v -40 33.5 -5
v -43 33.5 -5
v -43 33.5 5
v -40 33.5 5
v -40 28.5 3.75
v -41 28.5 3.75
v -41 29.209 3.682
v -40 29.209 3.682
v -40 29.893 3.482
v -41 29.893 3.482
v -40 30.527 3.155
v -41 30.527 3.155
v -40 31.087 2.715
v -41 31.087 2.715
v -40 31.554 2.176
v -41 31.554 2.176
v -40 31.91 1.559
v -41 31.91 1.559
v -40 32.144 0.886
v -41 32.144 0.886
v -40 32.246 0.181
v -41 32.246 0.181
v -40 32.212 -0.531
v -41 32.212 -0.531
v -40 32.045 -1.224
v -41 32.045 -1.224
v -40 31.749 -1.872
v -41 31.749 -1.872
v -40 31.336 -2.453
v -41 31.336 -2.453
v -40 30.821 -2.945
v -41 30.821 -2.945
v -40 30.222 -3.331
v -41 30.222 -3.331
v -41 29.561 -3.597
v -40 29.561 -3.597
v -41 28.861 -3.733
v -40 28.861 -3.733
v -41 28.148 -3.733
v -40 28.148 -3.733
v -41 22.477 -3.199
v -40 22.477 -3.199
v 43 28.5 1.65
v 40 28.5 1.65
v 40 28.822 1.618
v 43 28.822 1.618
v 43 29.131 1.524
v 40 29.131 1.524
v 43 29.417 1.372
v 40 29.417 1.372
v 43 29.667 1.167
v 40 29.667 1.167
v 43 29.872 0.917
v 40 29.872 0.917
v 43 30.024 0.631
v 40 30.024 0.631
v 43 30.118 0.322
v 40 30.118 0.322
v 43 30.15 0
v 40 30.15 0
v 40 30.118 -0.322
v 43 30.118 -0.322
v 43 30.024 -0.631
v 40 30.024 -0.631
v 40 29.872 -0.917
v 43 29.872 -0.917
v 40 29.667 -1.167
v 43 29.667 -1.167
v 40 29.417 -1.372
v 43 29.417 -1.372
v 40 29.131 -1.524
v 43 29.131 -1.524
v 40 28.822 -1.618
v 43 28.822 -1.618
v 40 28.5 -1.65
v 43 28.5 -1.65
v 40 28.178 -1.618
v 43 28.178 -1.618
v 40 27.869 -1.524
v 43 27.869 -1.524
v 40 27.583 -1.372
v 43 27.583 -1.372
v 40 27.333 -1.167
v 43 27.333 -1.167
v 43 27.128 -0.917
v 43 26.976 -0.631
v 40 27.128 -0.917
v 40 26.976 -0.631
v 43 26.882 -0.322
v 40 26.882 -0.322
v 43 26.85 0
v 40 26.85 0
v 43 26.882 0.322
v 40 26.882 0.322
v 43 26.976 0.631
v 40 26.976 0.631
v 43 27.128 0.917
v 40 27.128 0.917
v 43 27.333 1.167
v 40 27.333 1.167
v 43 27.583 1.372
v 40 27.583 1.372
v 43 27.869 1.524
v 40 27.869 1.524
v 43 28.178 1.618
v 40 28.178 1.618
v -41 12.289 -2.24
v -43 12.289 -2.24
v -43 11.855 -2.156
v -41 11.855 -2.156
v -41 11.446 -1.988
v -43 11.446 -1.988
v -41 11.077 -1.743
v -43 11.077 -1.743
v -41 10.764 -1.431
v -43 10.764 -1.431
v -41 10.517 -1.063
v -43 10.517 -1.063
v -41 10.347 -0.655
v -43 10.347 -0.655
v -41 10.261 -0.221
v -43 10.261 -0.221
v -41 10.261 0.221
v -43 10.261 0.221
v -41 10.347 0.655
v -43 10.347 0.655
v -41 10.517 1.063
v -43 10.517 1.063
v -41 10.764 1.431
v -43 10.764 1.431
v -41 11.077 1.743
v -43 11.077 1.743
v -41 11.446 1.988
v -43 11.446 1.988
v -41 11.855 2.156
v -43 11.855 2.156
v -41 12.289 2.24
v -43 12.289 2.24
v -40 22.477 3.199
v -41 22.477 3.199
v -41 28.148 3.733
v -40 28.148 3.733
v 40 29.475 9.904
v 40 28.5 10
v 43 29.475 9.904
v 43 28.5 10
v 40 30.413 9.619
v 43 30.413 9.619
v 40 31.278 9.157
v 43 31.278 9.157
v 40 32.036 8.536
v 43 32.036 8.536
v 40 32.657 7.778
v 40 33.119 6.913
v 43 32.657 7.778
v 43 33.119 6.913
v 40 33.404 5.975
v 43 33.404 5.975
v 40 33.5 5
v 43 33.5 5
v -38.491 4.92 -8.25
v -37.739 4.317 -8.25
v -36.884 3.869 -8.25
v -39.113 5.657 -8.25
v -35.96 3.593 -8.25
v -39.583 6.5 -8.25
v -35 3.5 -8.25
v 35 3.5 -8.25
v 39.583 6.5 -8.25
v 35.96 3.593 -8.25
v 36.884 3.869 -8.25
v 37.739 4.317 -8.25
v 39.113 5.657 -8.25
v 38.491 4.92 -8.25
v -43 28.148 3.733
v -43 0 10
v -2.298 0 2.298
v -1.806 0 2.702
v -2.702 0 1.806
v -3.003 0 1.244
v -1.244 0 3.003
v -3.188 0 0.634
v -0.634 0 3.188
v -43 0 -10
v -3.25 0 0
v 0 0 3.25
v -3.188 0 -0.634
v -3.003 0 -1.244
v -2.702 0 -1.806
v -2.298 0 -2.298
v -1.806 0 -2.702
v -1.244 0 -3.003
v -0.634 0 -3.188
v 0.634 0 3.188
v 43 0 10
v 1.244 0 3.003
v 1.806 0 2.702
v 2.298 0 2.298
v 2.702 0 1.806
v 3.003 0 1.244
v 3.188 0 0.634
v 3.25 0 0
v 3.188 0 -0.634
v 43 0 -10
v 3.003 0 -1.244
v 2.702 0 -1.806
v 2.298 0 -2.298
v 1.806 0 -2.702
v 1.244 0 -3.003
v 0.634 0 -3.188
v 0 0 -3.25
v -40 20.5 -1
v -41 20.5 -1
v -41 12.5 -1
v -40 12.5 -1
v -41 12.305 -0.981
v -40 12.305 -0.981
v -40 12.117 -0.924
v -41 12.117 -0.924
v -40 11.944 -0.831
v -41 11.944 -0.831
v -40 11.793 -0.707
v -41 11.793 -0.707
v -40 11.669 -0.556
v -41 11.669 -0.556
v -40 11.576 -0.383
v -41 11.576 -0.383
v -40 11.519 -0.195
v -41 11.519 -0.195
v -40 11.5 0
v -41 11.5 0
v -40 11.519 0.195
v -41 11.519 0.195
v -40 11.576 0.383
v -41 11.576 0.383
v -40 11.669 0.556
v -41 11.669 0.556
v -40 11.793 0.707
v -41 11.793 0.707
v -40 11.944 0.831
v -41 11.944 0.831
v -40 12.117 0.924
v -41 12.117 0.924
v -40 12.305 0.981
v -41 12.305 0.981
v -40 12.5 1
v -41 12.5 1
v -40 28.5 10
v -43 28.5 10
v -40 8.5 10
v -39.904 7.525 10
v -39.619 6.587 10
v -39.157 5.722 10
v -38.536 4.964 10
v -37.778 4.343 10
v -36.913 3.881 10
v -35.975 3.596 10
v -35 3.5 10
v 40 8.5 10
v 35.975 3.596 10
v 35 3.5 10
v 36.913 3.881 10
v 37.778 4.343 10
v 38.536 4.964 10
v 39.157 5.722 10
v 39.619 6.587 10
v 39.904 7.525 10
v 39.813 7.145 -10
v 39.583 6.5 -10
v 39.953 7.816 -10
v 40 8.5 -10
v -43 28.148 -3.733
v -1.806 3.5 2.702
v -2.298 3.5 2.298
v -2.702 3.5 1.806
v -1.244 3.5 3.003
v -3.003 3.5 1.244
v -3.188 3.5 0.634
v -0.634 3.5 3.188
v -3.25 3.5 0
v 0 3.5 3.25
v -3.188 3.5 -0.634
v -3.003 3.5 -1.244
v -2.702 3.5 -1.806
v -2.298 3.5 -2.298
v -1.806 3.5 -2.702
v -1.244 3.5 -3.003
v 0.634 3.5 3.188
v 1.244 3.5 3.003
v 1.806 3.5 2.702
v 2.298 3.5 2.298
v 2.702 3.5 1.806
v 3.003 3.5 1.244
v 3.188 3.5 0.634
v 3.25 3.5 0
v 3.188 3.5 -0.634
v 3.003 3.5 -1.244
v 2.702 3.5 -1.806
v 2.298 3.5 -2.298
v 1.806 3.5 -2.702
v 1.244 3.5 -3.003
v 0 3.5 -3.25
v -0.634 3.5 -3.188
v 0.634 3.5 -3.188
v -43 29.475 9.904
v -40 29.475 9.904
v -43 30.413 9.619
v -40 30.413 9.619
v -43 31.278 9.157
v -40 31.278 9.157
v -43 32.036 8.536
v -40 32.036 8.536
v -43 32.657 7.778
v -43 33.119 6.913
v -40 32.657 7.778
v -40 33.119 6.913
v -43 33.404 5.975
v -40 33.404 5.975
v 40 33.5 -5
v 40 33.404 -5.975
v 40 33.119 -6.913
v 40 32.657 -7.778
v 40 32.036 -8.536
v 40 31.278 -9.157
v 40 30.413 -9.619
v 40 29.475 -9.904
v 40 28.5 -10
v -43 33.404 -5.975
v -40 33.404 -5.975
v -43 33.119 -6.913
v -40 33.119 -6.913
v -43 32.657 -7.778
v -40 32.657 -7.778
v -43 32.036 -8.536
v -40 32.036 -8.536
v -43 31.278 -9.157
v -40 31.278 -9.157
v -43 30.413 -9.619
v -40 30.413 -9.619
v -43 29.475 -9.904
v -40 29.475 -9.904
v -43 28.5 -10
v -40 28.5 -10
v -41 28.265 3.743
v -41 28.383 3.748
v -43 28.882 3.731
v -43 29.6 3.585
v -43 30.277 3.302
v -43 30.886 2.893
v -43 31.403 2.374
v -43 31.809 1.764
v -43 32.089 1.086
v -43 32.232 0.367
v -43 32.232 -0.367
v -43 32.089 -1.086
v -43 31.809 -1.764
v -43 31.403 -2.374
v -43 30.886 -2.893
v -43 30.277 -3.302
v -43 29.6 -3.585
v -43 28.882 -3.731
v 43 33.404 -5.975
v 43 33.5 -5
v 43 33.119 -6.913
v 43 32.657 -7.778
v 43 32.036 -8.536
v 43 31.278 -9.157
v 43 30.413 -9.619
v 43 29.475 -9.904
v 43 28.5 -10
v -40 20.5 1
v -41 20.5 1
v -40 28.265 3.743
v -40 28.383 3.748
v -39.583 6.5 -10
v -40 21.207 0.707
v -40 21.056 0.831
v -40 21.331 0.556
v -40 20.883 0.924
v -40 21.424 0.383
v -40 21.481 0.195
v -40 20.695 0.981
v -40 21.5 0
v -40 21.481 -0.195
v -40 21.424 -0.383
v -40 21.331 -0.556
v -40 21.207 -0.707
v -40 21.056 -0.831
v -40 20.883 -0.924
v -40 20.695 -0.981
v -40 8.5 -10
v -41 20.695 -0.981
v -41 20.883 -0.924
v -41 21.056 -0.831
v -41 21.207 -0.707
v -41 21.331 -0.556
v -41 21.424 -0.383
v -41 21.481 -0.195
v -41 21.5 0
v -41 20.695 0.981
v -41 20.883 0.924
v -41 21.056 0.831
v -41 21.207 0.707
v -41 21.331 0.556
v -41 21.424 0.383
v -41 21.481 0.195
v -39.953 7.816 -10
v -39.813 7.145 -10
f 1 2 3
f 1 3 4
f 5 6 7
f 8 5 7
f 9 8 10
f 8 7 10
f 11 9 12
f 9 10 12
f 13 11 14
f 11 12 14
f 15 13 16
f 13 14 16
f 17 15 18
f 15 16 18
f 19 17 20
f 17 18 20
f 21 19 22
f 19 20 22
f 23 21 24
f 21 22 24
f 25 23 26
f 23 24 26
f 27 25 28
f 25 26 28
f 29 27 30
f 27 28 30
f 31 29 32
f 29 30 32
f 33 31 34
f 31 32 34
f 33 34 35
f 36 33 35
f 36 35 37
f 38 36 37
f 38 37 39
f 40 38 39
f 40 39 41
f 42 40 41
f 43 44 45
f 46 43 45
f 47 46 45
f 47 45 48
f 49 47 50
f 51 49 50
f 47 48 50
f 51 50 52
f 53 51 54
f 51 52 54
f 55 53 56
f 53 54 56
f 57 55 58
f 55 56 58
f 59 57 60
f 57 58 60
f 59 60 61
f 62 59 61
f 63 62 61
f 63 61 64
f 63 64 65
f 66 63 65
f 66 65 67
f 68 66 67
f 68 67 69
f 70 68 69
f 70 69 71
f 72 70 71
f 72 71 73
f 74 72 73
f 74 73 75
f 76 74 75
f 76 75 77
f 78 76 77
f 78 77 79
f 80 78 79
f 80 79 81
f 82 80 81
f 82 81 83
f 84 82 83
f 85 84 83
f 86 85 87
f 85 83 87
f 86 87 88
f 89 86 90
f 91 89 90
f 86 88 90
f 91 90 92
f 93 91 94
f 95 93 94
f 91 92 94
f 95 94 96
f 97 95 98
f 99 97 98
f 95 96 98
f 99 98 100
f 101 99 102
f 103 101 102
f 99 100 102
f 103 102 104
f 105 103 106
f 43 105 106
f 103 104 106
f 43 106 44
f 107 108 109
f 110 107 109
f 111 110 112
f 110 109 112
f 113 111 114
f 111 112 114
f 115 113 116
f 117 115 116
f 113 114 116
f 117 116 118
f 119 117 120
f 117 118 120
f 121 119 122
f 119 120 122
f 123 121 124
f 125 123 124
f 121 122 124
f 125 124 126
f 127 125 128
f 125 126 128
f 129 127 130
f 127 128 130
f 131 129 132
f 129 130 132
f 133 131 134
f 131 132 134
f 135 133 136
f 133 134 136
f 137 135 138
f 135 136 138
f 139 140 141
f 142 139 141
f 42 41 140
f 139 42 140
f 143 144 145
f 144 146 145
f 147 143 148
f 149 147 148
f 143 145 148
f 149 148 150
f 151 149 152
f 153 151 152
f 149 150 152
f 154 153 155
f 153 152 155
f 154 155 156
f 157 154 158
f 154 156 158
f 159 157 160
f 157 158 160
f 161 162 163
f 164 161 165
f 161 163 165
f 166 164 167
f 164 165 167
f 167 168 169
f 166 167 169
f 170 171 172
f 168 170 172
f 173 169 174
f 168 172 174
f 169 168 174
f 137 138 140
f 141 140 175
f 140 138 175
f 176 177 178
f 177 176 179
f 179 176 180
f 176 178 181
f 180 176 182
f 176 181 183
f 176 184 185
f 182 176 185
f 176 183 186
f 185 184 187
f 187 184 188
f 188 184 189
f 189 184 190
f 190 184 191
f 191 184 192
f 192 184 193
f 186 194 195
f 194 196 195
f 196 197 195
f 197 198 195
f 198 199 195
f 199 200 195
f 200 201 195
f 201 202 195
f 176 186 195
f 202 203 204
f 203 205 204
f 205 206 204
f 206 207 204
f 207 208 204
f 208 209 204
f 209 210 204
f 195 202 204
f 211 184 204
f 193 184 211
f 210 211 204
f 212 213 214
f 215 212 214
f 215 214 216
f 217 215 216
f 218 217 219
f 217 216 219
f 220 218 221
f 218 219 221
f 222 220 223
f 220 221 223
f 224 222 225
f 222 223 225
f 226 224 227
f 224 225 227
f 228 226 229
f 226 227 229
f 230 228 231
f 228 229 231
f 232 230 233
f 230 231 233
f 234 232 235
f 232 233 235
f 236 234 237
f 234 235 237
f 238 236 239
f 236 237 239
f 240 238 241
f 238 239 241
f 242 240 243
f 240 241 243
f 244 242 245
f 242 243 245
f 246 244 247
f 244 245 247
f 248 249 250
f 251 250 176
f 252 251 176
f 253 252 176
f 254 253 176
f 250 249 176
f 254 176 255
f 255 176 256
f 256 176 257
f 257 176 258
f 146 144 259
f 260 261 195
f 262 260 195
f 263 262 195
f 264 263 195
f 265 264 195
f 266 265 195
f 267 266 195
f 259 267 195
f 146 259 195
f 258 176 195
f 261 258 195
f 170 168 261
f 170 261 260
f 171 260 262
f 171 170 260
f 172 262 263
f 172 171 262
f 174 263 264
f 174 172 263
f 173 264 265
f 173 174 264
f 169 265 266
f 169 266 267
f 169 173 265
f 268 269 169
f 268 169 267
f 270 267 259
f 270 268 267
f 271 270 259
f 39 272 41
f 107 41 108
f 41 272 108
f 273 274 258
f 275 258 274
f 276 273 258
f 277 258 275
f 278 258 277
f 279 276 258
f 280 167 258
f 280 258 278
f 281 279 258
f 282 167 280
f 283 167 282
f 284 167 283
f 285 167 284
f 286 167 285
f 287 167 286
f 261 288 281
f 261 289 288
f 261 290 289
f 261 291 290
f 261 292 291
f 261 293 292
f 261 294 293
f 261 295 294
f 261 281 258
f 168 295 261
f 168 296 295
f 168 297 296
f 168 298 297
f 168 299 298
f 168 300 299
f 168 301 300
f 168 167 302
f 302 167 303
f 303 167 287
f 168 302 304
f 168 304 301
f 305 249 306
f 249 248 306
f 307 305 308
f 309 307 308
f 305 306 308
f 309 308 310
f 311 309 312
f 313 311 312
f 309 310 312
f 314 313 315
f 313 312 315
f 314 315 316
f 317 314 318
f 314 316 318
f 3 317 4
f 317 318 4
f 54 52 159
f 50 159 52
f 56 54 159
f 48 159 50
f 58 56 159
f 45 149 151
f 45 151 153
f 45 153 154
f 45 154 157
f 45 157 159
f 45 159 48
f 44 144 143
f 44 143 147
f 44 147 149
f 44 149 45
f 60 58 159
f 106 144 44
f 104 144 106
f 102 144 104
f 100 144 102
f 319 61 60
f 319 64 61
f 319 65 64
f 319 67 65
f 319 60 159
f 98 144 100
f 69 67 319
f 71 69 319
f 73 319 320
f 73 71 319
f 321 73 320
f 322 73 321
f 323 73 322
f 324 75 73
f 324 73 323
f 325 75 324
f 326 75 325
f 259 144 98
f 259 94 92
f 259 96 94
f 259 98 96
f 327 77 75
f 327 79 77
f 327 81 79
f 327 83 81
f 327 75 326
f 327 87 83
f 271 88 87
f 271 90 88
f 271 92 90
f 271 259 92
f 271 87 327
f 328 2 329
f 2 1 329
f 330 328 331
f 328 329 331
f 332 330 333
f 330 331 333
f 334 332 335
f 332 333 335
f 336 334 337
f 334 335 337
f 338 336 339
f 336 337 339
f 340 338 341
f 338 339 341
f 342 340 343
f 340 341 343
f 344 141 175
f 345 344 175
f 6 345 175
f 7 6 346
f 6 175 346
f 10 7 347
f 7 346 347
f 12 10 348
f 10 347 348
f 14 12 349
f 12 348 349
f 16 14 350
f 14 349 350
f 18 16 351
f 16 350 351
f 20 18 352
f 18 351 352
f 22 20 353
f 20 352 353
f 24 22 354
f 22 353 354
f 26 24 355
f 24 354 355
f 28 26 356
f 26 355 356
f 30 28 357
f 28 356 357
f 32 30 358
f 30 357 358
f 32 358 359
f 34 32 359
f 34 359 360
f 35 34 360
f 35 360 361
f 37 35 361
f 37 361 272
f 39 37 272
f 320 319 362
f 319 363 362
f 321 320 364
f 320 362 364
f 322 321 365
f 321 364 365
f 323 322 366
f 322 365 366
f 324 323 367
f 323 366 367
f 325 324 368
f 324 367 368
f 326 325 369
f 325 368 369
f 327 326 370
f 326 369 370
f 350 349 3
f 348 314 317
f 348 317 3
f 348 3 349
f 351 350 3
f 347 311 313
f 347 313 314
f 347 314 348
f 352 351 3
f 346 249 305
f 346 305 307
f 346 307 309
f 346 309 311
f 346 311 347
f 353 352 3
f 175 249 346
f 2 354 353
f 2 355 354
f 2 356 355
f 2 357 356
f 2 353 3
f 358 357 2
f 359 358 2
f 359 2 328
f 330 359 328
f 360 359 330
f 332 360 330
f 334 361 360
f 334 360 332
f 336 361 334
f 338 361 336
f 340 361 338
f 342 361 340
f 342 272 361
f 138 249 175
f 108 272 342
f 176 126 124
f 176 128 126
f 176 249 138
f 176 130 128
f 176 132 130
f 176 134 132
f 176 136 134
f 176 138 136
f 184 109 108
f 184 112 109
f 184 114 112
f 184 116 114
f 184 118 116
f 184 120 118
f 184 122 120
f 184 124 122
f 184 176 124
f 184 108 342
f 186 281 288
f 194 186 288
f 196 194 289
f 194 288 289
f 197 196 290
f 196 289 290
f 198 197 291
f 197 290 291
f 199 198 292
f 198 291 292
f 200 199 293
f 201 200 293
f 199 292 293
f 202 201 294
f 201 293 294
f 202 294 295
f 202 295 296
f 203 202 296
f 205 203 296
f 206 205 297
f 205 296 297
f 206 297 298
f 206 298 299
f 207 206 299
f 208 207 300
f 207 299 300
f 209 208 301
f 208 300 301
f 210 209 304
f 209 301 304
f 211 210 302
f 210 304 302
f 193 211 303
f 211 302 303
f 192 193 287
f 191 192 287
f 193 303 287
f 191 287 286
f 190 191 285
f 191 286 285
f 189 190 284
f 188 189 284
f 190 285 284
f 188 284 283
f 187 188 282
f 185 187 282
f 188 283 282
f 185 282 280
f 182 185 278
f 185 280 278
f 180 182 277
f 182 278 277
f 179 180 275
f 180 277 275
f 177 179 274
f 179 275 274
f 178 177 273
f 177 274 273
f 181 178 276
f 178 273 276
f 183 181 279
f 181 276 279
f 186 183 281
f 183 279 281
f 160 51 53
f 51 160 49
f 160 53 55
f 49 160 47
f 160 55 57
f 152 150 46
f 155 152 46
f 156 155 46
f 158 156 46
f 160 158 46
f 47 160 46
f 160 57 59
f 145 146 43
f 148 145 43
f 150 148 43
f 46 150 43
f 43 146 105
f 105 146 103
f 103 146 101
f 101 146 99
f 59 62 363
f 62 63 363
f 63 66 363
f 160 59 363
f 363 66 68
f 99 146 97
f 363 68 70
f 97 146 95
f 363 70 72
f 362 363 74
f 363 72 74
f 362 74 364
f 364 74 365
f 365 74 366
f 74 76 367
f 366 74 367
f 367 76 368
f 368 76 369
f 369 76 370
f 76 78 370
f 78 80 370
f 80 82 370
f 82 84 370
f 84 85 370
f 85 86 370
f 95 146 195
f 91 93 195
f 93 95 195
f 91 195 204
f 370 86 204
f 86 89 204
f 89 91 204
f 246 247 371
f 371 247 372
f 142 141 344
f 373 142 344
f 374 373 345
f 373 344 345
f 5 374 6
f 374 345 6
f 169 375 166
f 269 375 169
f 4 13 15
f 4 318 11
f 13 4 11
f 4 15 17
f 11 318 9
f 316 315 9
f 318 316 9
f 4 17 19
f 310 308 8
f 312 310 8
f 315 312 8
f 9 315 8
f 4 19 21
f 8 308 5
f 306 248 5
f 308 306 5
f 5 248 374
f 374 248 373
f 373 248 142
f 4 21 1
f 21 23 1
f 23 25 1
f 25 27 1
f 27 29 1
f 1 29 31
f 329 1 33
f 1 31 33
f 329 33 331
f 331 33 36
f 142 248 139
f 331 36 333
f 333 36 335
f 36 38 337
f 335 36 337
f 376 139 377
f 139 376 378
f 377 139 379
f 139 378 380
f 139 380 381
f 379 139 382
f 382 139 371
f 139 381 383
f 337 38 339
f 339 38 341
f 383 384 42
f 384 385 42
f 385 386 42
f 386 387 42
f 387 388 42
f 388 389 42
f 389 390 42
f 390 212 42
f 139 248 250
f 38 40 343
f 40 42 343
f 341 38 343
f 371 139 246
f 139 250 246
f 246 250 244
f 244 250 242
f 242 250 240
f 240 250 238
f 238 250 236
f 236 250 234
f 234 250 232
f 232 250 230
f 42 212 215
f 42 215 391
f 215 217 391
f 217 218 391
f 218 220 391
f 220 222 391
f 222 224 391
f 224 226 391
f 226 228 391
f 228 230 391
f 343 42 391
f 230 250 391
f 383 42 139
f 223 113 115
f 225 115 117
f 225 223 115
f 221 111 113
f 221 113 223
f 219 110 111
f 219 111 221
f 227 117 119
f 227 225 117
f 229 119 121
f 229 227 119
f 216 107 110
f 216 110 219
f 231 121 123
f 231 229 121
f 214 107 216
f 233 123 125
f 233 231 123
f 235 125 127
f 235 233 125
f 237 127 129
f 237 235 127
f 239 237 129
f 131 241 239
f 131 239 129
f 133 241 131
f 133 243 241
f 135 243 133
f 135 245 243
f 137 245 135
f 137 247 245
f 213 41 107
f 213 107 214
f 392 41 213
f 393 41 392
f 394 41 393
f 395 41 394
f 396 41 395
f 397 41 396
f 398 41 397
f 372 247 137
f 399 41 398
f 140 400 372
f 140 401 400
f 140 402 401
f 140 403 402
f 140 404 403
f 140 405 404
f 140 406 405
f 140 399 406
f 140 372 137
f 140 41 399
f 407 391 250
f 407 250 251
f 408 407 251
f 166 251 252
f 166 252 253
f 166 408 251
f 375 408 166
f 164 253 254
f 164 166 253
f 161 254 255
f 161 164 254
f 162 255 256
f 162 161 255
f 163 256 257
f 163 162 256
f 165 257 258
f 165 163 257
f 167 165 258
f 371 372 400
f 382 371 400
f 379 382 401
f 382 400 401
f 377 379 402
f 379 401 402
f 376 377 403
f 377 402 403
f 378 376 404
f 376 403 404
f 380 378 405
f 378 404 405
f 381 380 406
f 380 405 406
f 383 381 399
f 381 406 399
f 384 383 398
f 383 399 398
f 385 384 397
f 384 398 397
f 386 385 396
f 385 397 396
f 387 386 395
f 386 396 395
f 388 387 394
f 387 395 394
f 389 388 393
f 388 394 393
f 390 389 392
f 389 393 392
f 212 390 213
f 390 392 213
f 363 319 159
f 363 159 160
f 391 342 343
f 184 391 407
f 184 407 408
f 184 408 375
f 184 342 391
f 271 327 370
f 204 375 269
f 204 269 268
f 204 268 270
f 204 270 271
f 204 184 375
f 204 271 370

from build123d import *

# Parameters (mm, degrees)
SKETCH_1_W          = 86
SKETCH_1_H          = 20
EXTRUDE_1_DEPTH     = 3.5
SKETCH_2_R          = 3.25
CUT_EXTRUDE_1_DEPTH = 3.5
SKETCH_3_W          = 3
SKETCH_3_H          = 20
EXTRUDE_2_DEPTH     = 30
FILLET_1_R          = 5
FILLET_2_R          = 5
SKETCH_4_R          = 1.65
CUT_EXTRUDE_2_DEPTH = 91
FILLET_3_R          = 5
SKETCH_6_R          = 1.65
CUT_EXTRUDE_3_DEPTH = 2
SKETCH_7_R          = 1.65
CUT_EXTRUDE_4_DEPTH = 1
SKETCH_8_W          = 80.307081952
SKETCH_8_H          = 1.75
EXTRUDE_3_DEPTH     = 3


with BuildPart() as part:
    # 草图1 → 凸台-拉伸1 (new body)
    with BuildSketch(Plane(origin=(0, 0, 0), x_dir=(1, 0, 0), z_dir=(0, 1, 0))):
        Rectangle(SKETCH_1_W, SKETCH_1_H)
    extrude(amount=EXTRUDE_1_DEPTH)

    # 草图2 → 切除-拉伸1 (cut)
    with BuildSketch(Plane(origin=(0, 3.5, 0), x_dir=(1, 0, 0), z_dir=(0, 1, 0))):
        with Locations(Location((0, 0, 0), (0, 0, 270))):
            Circle(SKETCH_2_R)
    extrude(amount=-CUT_EXTRUDE_1_DEPTH, mode=Mode.SUBTRACT)

    # 草图3 → 凸台-拉伸2 (add)
    with BuildSketch(Plane(origin=(0, 3.5, 0), x_dir=(1, 0, 0), z_dir=(0, 1, 0))):
        with Locations((41.5, 0)):
            Rectangle(SKETCH_3_W, SKETCH_3_H)
        with Locations((-41.5, 0)):
            Rectangle(SKETCH_3_W, SKETCH_3_H)
    extrude(amount=EXTRUDE_2_DEPTH)

    # 圆角1
    fillet_1_edges = [part.edges().sort_by_distance(p)[0] for p in [
        (-40, 3.5, 0),
    ]]
    fillet(fillet_1_edges, radius=FILLET_1_R)

    # 圆角2
    fillet_2_edges = [part.edges().sort_by_distance(p)[0] for p in [
        (40, 3.5, 0),
    ]]
    fillet(fillet_2_edges, radius=FILLET_2_R)

    # 草图4 → 切除-拉伸2 (cut)
    with BuildSketch(Plane.ZY.offset(43)):
        with Locations((0, 28.5)):
            Circle(SKETCH_4_R)
    extrude(amount=-CUT_EXTRUDE_2_DEPTH, mode=Mode.SUBTRACT)

    # 圆角3
    fillet_3_edges = [part.edges().sort_by_distance(p)[0] for p in [
        (41.5, 33.5, -10),
        (41.5, 33.5, 10),
        (-41.5, 33.5, 10),
        (-41.5, 33.5, -10),
    ]]
    fillet(fillet_3_edges, radius=FILLET_3_R)

    # 草图6 → 切除-拉伸3 (cut)
    with BuildSketch(Plane.ZY.offset(43)):
        with BuildLine():
            Line((2.240090483, 12.2890625), (3.733484138, 28.1484375))
            ThreePointArc((3.733484138, 28.1484375), (0, 32.25), (-3.733484138, 28.1484375))
            Line((-3.733484138, 28.1484375), (-2.240090483, 12.2890625))
            ThreePointArc((-2.240090483, 12.2890625), (0, 10.25), (2.240090483, 12.2890625))
        make_face()
        with Locations((0, 28.5)):
            Circle(SKETCH_6_R, mode=Mode.SUBTRACT)
    extrude(amount=-CUT_EXTRUDE_3_DEPTH, mode=Mode.SUBTRACT)

    # 草图7 → 切除-拉伸4 (cut)
    # profile 1 of 3: a face of its own
    with BuildSketch(Plane.ZY.offset(41)):
        with BuildLine():
            ThreePointArc((3.75, 28.5), (-0.175975116, 32.245868759), (-3.733484138, 28.1484375))
            ThreePointArc((-3.733484138, 28.1484375), (0, 24.75), (3.733484138, 28.1484375))
            ThreePointArc((3.733484138, 28.1484375), (3.745868759, 28.324024884), (3.75, 28.5))
        make_face()
        with Locations((0, 28.5)):
            Circle(SKETCH_7_R, mode=Mode.SUBTRACT)
    # profile 2 of 3: a face of its own
    with BuildSketch(Plane.ZY.offset(41)):
        with BuildLine():
            Line((-3.733484138, 28.1484375), (-3.199423337, 22.476878304))
            Line((-3.199423337, 22.476878304), (3.199423337, 22.476878304))
            Line((3.199423337, 22.476878304), (3.733484138, 28.1484375))
            ThreePointArc((3.733484138, 28.1484375), (0, 24.75), (-3.733484138, 28.1484375))
        make_face()
    # profile 3 of 3: a face of its own
    with BuildSketch(Plane.ZY.offset(41)):
        with BuildLine():
            Line((-1, 20.5), (-1, 12.5))
            ThreePointArc((-1, 12.5), (0, 11.5), (1, 12.5))
            Line((1, 12.5), (1, 20.5))
            ThreePointArc((1, 20.5), (0, 21.5), (-1, 20.5))
        make_face()
    extrude(amount=-CUT_EXTRUDE_4_DEPTH, mode=Mode.SUBTRACT)

    # 草图8 → 凸台-拉伸3 (add)
    with BuildSketch(Plane(origin=(0, 3.5, 0), x_dir=(1, 0, 0), z_dir=(0, 1, 0))):
        with Locations((0.153540976, 9.125)):
            Rectangle(SKETCH_8_W, SKETCH_8_H)
    extrude(amount=EXTRUDE_3_DEPTH)


solid = part.part
